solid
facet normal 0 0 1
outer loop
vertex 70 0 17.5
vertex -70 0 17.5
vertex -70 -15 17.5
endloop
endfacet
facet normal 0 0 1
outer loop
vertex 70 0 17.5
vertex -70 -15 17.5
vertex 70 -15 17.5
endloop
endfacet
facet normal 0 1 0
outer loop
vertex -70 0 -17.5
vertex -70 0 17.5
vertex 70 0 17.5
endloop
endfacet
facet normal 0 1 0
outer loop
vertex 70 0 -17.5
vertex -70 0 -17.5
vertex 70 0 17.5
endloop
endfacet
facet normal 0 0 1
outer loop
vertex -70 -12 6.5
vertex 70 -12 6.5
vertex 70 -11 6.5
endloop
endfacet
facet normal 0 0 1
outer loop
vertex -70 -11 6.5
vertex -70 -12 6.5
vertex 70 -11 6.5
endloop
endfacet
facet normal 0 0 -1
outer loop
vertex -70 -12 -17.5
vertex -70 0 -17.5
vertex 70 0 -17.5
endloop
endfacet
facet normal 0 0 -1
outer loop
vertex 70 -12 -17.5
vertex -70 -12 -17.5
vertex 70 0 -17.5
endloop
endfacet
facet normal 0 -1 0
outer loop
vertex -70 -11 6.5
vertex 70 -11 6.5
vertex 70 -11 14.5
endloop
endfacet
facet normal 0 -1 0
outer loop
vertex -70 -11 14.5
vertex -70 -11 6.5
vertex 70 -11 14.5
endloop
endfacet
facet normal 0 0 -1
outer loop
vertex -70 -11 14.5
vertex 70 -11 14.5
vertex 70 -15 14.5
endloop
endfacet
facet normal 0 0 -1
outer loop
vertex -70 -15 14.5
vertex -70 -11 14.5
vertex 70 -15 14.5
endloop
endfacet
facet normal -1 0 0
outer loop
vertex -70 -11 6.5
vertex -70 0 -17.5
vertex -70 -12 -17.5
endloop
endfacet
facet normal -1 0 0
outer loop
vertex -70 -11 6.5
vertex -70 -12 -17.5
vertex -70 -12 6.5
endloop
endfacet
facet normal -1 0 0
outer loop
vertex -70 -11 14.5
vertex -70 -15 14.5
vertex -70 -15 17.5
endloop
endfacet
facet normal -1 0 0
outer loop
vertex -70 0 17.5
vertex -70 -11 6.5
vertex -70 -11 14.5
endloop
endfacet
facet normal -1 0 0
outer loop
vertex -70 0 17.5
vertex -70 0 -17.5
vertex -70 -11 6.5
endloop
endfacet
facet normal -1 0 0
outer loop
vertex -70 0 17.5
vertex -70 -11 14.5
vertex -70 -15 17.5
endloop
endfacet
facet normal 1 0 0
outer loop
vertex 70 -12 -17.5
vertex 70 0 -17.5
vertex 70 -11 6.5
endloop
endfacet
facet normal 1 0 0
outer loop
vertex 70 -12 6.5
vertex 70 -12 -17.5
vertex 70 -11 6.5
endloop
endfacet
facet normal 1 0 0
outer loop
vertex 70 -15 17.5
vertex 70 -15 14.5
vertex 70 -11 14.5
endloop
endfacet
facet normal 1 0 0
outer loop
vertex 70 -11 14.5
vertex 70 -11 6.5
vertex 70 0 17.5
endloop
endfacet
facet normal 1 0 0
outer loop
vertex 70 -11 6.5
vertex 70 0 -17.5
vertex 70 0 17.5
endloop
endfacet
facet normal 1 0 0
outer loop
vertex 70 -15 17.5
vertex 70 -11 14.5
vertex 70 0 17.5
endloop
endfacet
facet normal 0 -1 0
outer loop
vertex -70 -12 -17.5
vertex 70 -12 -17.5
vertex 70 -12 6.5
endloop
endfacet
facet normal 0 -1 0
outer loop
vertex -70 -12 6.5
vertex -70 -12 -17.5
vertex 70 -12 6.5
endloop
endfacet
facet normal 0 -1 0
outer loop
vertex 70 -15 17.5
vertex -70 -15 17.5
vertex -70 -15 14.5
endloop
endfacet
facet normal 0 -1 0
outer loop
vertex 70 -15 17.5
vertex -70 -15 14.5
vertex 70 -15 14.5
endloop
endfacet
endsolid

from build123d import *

# Parameters (mm, degrees)
F0_W     = 140
F0_H     = 35
F1_DEPTH = 15
F3_DEPTH = 140


with BuildPart() as f1:
    # F0 (on Front) → F1 (new body)
    with BuildSketch(Plane.XZ):
        Rectangle(F0_W, F0_H)
    extrude(amount=F1_DEPTH)

    # F2 (on face) → F3 (cut, through all)
    with BuildSketch(Plane.YZ.offset(70)):
        Polygon((-15, 14.5), (-15, -17.5), (-12, -17.5), (-12, 6.5), (-11, 6.5), (-11, 14.5), align=None)
    extrude(amount=-F3_DEPTH, mode=Mode.SUBTRACT)


solid = f1.part
